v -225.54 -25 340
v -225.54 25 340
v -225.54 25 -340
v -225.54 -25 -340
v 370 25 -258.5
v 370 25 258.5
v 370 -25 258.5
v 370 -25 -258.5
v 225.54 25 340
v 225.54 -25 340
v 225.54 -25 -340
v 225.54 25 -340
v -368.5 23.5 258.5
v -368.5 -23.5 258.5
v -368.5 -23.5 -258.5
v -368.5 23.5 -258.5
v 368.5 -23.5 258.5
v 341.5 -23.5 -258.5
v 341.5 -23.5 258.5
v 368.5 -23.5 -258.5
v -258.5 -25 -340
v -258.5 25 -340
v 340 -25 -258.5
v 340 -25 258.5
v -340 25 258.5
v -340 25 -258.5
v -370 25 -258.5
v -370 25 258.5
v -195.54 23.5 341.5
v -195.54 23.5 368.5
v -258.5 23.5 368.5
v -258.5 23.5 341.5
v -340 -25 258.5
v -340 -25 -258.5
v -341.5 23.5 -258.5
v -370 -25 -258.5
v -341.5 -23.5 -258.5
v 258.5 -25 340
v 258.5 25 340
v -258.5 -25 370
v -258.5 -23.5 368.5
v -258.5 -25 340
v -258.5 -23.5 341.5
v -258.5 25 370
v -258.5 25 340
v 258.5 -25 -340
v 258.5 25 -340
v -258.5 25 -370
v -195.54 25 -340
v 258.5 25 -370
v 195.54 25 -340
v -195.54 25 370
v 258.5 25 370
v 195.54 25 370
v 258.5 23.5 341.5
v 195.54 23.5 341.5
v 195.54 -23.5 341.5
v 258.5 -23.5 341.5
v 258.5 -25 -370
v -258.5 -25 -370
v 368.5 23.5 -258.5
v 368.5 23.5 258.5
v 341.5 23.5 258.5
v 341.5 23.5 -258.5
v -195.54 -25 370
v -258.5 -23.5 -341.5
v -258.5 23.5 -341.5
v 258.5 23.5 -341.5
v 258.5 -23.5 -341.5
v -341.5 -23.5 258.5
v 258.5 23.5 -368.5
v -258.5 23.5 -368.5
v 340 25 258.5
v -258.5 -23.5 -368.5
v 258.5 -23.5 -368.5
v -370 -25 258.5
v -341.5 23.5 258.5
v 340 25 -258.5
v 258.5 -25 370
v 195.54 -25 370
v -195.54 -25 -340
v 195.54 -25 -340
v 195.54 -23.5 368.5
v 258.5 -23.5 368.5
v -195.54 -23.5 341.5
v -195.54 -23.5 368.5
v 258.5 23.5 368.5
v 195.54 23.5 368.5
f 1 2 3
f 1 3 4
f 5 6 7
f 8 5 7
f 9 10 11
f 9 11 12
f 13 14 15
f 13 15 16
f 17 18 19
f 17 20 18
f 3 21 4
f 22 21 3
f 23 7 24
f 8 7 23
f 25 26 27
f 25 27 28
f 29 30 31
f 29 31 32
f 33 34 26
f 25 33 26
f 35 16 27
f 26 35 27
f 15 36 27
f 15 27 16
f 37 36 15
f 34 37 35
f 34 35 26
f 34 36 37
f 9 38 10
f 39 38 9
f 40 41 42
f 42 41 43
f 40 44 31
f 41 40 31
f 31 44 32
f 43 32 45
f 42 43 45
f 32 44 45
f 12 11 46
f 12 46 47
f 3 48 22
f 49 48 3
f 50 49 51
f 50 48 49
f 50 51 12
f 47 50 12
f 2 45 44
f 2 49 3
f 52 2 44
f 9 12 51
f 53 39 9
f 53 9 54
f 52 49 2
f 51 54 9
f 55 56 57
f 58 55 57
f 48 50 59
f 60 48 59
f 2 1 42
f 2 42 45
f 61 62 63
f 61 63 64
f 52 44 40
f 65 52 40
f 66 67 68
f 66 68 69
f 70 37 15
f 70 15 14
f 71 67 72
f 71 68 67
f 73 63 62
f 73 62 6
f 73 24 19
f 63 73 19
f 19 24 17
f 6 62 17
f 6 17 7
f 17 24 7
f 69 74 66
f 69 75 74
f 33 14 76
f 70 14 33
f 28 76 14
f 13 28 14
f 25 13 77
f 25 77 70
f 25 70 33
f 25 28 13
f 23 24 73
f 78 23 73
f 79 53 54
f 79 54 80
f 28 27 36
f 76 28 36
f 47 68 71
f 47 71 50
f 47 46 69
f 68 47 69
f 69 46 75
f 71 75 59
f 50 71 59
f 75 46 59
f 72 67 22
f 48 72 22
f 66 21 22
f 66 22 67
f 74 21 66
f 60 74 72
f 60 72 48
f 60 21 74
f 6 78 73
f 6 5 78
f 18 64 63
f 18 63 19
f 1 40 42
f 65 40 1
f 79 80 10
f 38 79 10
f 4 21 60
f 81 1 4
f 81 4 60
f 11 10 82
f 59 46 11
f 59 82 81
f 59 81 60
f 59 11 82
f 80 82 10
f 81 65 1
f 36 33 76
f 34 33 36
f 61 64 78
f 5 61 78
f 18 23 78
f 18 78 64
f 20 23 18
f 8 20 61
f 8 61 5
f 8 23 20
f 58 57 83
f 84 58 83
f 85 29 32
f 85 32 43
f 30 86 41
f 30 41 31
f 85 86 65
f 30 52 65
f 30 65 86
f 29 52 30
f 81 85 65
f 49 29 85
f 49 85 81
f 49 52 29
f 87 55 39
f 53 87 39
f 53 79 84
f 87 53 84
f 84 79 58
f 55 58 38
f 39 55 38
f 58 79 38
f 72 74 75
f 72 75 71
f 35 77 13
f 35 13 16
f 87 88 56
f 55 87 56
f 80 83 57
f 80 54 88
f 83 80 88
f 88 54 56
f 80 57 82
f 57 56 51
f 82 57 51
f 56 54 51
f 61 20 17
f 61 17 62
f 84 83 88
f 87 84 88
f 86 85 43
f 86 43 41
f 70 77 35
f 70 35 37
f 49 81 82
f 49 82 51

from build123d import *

# Parameters (mm, degrees)
ESBO_O2_W             = 30
ESBO_O2_H             = 50
ESBO_O2_W_2           = 27
ESBO_O2_H_2           = 47
ESBO_O3_W             = 223
ESBO_O3_H             = 223
CORTE_EXTRUS_O1_DEPTH = 185
ESBO_O6_W             = 30
ESBO_O6_H             = 50
ESBO_O8_W             = 30
ESBO_O8_H             = 50
ESBO_O13_W            = 391.08
ESBO_O13_H            = 30
CORTE_EXTRUS_O3_DEPTH = 92


with BuildPart() as part:
    # Varredura1: sweep along a path in Esboço1
    with BuildLine(Plane(origin=(0, 0, 0), x_dir=(1, 0, 0), z_dir=(0, 1, 0))) as varredura1_path:
        Line((-355, -355), (355, -355))
        Line((355, -355), (355, 355))
        Line((355, 355), (-355, 355))
        Line((-355, 355), (-355, -355))
    # Esboço2 → Varredura1 (sweep)
    with BuildSketch(Plane.XY):
        with Locations((-355, 0)):
            Rectangle(ESBO_O2_W, ESBO_O2_H)
        with Locations((-355, 0)):
            Rectangle(ESBO_O2_W_2, ESBO_O2_H_2, mode=Mode.SUBTRACT)
    sweep(path=varredura1_path.line, transition=Transition.RIGHT)

    # Esboço3 → Corte-extrusão1 (cut, symmetric)
    with BuildSketch(Plane(origin=(0, 25, 0), x_dir=(1, 0, 0), z_dir=(0, 1, 0))):
        with Locations((-370, 370)):
            Rectangle(ESBO_O3_W, ESBO_O3_H)
        with Locations((370, 370)):
            Rectangle(ESBO_O3_W, ESBO_O3_H)
        with Locations((370, -370)):
            Rectangle(ESBO_O3_W, ESBO_O3_H)
        with Locations((-370, -370)):
            Rectangle(ESBO_O3_W, ESBO_O3_H)
    extrude(amount=CORTE_EXTRUS_O1_DEPTH, both=True, mode=Mode.SUBTRACT)


with BuildPart() as corte_extrus_o1_piece_1:
    # of the separate pieces the step leaves, piece 1, a body of its own (corte_extrus_o1_pieces)
    add(part.part.solids().sort_by_distance((-370, -25, 258.5))[0])


with BuildPart() as corte_extrus_o1_piece_2:
    # of the separate pieces the step leaves, piece 2, a body of its own (corte_extrus_o1_pieces)
    add(part.part.solids().sort_by_distance((-258.5, -25, -340))[0])



with BuildPart() as corte_extrus_o1_piece_3:
    # of the separate pieces the step leaves, piece 3, a body of its own (corte_extrus_o1_pieces)
    add(part.part.solids().sort_by_distance((-258.5, -25, 370))[0])


with BuildPart() as corte_extrus_o1_piece_4:
    # of the separate pieces the step leaves, piece 4, a body of its own (corte_extrus_o1_pieces)
    add(part.part.solids().sort_by_distance((370, -25, 258.5))[0])


with BuildPart() as corte_extrus_o1_piece_2_1:
    add(corte_extrus_o1_piece_2.part)

    add(corte_extrus_o1_piece_3.part)  # Varredura2 merges Corte-extrusão1 piece 3
    # Varredura2: sweep along a path in Esboço4
    with BuildLine(Plane(origin=(0, 0, 0), x_dir=(1, 0, 0), z_dir=(0, 1, 0))) as varredura2_path:
        Line((-210.54, 340), (-210.54, -340))
    # Esboço6 → Varredura2 (sweep)
    with BuildSketch(Plane.XY):
        with Locations((-210.54, 0)):
            Rectangle(ESBO_O6_W, ESBO_O6_H)
    sweep(path=varredura2_path.line)

    # Varredura3: sweep along a path in Esboço7
    with BuildLine(Plane(origin=(0, 0, 0), x_dir=(1, 0, 0), z_dir=(0, 1, 0))) as varredura3_path:
        Line((210.54, 340), (210.54, -340))
    # Esboço8 → Varredura3 (sweep)
    with BuildSketch(Plane.XY):
        with Locations((210.54, 0)):
            Rectangle(ESBO_O8_W, ESBO_O8_H)
    sweep(path=varredura3_path.line)

    # Esboço13 → Corte-extrusão3 (cut)
    with BuildSketch(Plane(origin=(0, 25, 0), x_dir=(1, 0, 0), z_dir=(0, 1, 0))):
        with Locations((0, -355)):
            Rectangle(ESBO_O13_W, ESBO_O13_H)
    extrude(amount=-CORTE_EXTRUS_O3_DEPTH, mode=Mode.SUBTRACT)


solid = Compound([corte_extrus_o1_piece_1.part, corte_extrus_o1_piece_4.part, corte_extrus_o1_piece_2_1.part])
